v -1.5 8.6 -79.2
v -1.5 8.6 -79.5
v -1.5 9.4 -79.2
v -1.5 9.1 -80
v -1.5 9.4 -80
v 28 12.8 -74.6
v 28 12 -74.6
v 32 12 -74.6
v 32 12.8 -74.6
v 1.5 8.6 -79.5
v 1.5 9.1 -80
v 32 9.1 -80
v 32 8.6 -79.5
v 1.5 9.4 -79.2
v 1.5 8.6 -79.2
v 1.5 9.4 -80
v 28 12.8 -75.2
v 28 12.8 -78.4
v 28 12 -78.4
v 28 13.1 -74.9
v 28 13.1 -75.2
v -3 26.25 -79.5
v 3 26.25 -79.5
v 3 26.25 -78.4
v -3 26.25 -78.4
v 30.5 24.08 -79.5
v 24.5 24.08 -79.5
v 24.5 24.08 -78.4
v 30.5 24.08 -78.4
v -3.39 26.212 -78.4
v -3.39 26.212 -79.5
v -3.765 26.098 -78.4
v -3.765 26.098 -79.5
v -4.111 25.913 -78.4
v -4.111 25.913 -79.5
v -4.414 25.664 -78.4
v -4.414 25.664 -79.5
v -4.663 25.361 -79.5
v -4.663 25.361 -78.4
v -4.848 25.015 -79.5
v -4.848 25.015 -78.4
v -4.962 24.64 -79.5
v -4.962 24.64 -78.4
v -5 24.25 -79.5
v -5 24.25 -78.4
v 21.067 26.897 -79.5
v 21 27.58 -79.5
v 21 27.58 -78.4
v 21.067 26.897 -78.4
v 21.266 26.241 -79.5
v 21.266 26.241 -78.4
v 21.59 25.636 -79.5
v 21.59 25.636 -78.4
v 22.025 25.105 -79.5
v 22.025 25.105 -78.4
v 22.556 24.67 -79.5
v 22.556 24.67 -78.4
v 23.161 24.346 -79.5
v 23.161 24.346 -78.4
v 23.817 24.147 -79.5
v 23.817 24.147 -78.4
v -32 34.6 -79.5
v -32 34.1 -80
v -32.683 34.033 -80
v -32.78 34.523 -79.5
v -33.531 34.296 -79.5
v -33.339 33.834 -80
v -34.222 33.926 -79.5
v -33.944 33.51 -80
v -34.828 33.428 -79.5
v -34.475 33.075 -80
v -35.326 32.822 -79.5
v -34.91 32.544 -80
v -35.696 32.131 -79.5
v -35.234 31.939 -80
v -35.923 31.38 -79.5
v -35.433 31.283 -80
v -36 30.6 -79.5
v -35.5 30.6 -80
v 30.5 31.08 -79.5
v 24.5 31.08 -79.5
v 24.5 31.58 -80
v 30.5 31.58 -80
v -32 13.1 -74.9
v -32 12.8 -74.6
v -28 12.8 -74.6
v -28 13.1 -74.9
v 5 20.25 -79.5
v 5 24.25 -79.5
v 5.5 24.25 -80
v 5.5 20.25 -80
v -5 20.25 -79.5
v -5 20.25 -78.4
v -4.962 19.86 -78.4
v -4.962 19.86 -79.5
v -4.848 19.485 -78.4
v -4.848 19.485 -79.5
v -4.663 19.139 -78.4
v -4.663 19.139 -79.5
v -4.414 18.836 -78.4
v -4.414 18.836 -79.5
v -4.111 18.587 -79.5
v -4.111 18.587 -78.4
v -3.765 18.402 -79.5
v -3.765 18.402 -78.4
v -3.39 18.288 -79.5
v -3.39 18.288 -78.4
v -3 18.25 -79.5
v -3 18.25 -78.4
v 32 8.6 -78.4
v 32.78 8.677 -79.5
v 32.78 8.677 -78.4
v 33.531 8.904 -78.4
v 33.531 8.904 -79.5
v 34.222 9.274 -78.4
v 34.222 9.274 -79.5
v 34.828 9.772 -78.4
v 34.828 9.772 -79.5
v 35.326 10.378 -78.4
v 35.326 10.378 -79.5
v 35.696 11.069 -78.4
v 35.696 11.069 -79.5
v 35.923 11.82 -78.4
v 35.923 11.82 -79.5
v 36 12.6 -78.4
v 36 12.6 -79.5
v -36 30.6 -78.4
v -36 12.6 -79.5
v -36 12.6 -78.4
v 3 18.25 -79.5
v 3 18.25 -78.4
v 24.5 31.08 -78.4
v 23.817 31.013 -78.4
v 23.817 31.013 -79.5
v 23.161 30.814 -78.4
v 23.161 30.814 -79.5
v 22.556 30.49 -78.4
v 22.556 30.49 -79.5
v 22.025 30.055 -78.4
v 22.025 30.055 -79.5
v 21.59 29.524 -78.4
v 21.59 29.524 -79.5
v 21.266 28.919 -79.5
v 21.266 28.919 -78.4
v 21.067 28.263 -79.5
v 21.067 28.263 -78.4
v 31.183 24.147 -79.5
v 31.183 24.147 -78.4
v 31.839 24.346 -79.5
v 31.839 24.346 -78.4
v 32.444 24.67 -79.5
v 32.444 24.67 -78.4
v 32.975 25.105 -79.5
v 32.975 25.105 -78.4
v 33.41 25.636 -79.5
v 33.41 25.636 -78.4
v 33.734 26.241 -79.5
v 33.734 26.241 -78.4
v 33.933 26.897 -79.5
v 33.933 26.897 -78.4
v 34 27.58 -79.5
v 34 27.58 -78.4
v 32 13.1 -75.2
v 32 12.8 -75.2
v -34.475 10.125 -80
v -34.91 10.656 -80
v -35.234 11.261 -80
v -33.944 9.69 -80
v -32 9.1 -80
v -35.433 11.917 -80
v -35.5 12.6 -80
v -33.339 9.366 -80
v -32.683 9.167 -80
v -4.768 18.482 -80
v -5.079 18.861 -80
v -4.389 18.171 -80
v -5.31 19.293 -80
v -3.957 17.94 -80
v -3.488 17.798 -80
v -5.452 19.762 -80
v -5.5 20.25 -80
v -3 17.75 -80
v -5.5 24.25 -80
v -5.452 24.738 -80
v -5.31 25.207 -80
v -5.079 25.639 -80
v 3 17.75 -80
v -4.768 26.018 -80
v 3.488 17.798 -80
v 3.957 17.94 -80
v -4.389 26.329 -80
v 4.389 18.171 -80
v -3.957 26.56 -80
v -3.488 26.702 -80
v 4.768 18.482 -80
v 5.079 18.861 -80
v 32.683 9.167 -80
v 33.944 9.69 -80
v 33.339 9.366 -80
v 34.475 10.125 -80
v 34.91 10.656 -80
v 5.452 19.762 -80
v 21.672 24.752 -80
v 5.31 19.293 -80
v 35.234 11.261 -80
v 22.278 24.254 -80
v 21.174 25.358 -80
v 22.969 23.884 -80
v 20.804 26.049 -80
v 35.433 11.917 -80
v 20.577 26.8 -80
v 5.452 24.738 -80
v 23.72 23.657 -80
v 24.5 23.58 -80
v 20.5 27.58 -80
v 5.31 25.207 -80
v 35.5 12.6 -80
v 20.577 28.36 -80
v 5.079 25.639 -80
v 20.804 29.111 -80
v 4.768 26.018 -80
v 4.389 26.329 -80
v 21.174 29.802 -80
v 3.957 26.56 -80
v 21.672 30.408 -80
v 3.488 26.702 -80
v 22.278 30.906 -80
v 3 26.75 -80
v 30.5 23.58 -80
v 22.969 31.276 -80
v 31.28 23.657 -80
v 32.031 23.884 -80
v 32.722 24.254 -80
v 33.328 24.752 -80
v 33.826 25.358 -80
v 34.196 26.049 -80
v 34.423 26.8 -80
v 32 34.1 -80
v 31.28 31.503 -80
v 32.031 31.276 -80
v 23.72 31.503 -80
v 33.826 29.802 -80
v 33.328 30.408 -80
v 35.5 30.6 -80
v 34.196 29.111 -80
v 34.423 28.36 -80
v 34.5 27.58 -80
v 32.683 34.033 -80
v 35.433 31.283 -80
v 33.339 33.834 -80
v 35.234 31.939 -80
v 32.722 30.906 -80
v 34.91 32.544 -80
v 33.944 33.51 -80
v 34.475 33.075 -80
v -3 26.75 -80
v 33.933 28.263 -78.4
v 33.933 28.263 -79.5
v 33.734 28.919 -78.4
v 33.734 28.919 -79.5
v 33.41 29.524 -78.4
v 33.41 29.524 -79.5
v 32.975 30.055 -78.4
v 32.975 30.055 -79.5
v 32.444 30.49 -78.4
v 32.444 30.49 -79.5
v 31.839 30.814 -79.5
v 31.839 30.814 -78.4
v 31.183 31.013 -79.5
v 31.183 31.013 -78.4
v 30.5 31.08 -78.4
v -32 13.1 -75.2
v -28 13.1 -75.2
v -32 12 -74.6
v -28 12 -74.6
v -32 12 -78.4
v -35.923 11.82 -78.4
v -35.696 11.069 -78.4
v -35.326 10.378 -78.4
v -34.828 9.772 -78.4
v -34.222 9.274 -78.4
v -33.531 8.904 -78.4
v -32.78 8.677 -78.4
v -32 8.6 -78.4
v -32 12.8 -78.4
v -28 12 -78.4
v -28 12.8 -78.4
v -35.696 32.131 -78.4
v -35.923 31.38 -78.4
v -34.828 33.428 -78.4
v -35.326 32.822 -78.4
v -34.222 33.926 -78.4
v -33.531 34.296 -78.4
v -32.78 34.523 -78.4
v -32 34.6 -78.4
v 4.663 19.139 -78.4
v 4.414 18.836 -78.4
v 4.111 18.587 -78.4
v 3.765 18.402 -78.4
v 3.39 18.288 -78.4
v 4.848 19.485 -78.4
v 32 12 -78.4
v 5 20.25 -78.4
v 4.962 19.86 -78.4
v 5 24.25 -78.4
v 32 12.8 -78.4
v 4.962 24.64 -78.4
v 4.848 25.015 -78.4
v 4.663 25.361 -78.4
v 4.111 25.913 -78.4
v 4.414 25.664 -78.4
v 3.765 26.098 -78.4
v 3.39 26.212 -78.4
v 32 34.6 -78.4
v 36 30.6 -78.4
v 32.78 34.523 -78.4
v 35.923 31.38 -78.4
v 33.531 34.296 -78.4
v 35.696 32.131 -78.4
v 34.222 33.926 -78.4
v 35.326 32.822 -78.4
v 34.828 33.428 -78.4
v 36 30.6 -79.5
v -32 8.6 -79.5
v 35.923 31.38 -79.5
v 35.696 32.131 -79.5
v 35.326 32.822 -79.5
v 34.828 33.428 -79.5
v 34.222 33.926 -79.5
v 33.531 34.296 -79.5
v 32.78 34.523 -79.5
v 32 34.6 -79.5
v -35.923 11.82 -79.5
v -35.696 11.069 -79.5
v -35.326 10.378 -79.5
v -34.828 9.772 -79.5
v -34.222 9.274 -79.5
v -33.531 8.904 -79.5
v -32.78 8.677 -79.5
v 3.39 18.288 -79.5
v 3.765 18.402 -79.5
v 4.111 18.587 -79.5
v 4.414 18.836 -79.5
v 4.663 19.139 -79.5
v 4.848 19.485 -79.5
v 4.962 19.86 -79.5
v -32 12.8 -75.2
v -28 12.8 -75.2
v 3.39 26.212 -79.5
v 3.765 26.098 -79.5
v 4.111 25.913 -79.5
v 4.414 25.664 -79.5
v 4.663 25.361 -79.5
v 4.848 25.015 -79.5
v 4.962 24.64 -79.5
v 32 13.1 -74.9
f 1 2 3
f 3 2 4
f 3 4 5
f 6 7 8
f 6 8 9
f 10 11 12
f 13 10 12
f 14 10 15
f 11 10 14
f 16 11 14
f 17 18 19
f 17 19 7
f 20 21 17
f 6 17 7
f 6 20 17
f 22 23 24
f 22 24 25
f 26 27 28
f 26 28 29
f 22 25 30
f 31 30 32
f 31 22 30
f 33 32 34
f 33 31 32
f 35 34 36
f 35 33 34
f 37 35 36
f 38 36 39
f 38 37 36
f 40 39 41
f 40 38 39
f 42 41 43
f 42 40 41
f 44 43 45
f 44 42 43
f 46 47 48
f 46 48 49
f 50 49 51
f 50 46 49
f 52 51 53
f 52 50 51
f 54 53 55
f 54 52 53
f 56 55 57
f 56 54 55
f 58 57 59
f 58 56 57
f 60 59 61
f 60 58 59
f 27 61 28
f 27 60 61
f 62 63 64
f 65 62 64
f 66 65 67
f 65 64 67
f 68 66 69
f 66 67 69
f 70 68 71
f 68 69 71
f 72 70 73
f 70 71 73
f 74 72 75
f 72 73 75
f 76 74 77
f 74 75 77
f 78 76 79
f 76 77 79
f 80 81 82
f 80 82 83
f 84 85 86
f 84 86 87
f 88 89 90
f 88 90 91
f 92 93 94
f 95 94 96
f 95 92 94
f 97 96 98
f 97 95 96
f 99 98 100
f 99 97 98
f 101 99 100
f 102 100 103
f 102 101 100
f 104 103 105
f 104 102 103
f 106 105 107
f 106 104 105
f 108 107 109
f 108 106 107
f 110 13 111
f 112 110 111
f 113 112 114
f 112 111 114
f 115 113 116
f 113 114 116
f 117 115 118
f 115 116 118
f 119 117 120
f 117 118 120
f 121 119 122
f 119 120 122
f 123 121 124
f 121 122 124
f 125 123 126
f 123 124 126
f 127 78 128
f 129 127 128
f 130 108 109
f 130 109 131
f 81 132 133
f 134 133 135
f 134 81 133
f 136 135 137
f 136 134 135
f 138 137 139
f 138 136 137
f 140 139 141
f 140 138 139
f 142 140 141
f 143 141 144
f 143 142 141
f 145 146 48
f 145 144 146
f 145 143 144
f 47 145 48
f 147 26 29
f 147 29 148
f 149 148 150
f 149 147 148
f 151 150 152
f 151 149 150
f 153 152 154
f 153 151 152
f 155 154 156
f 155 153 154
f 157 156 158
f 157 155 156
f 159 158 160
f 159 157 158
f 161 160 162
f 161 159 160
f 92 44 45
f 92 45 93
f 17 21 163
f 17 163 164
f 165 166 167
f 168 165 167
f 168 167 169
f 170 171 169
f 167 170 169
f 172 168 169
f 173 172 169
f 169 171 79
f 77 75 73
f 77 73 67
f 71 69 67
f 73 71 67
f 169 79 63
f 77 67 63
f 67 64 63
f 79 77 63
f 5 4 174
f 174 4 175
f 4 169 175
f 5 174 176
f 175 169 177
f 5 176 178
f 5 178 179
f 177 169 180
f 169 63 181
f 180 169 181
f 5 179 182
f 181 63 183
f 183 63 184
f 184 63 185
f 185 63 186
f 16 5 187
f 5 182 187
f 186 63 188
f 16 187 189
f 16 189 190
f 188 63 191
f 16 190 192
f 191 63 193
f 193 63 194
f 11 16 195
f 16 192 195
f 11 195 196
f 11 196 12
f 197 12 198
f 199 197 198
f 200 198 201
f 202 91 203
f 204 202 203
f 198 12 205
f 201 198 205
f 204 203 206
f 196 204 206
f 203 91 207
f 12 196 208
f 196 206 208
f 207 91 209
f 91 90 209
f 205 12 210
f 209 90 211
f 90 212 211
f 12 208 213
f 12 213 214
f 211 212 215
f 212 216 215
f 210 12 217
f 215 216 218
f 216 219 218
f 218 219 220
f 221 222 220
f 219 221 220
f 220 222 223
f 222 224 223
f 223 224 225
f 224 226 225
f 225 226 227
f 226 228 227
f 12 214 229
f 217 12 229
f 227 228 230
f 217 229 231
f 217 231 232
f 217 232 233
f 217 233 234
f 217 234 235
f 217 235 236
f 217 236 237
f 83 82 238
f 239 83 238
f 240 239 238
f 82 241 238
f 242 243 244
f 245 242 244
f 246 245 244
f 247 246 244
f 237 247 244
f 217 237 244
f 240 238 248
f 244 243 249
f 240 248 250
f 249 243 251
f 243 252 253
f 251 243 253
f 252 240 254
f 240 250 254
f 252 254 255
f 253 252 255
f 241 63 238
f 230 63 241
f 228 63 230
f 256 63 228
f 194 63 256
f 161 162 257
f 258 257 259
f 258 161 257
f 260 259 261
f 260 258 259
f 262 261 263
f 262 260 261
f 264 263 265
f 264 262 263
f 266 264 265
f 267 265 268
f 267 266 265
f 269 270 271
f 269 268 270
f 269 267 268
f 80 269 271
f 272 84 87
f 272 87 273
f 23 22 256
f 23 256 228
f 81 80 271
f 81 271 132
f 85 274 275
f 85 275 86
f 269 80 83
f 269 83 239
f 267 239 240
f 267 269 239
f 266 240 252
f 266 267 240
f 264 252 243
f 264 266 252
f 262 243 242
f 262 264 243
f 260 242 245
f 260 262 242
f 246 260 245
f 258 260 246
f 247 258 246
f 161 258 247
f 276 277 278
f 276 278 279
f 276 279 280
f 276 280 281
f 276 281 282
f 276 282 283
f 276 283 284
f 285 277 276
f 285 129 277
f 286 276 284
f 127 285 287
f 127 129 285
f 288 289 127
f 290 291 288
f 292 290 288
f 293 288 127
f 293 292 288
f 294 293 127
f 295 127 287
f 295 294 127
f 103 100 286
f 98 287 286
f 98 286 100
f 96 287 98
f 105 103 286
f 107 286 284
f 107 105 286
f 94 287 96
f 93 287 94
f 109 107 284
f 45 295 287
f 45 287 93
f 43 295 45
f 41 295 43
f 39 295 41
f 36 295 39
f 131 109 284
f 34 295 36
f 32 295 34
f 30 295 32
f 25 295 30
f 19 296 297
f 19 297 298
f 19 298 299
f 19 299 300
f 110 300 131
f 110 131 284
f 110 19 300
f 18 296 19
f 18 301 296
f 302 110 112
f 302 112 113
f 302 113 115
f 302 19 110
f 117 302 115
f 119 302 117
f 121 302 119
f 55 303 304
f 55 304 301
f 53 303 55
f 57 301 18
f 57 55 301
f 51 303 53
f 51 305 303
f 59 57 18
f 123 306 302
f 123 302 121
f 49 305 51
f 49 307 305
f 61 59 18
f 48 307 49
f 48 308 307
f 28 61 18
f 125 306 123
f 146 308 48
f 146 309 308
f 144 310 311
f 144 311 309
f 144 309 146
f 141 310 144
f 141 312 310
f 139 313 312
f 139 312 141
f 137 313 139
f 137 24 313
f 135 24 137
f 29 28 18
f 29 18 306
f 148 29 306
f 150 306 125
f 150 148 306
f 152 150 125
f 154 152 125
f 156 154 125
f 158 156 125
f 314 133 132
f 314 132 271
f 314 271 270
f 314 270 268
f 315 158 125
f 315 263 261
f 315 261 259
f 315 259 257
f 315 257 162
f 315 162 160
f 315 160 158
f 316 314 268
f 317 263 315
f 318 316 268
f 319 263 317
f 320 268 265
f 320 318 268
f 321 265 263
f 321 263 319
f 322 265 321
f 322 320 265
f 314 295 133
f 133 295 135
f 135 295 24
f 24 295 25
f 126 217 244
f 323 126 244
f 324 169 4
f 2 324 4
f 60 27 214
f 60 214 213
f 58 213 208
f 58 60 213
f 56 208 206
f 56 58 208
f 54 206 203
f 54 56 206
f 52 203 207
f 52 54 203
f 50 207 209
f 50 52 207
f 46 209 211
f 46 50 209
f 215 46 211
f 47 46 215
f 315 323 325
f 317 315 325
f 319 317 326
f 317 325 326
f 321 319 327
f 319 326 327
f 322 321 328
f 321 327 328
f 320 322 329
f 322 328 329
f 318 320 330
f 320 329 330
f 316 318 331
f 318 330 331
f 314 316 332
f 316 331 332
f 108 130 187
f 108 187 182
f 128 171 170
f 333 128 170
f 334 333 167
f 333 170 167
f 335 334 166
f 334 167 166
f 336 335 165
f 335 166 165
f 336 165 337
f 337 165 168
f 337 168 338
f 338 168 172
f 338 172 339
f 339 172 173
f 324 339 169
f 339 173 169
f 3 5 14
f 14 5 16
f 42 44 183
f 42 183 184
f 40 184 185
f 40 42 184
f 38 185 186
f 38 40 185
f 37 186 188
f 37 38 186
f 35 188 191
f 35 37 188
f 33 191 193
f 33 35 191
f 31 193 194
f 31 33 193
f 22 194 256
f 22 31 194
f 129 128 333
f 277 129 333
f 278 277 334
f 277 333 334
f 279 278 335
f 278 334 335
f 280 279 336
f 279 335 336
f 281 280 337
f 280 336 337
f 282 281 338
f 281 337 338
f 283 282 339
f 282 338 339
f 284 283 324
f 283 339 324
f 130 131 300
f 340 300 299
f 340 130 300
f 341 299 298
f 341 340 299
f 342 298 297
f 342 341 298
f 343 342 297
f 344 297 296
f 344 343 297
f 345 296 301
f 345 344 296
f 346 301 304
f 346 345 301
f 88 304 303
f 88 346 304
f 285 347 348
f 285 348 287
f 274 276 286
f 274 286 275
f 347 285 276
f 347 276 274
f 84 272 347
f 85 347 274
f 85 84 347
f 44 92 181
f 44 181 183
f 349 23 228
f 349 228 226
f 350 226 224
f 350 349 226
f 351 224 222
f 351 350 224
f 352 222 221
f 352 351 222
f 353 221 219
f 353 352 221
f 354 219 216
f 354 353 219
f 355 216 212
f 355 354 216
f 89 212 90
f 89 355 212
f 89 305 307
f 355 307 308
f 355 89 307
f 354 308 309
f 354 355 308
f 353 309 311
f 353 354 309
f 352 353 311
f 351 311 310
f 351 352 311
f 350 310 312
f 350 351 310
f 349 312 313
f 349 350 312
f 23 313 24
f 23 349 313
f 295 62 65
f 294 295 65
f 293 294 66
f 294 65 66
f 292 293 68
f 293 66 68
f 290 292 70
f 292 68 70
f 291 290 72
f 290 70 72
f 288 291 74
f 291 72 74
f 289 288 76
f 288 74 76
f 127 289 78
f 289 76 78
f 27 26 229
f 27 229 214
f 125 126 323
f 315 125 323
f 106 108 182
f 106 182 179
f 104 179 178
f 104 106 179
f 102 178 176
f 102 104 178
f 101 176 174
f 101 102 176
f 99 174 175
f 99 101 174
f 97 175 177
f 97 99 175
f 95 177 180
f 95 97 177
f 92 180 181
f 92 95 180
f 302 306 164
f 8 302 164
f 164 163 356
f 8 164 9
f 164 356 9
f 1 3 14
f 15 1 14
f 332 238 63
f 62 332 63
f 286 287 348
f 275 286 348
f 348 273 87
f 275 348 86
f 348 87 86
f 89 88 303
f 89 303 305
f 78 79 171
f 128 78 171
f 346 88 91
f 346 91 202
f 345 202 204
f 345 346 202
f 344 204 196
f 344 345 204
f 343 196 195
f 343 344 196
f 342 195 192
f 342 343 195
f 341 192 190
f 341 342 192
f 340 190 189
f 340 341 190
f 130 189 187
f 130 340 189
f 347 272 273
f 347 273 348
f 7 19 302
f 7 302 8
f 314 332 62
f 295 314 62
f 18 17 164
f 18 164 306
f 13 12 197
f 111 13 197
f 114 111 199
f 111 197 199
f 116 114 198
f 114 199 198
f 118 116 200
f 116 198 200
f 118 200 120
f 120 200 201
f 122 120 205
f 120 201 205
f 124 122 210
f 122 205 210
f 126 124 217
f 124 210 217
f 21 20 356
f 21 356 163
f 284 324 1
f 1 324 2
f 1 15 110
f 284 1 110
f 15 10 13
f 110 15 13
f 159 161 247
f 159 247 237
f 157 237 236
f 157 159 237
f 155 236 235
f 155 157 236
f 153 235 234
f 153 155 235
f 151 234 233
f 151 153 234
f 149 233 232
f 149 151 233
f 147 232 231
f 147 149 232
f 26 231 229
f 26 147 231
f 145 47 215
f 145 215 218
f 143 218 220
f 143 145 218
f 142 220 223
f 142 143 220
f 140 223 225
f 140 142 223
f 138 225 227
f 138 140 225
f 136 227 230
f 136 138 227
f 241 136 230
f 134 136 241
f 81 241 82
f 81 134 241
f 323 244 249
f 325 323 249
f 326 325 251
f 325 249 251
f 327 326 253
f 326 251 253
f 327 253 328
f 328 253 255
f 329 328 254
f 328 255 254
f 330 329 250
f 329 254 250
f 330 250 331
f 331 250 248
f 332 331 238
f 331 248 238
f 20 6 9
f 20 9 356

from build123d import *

# Parameters (mm, degrees)
BOSS_EXTRUDE1_START = -80
BOSS_EXTRUDE1_DEPTH = 1.6
CHAMFER1_SIZE       = 0.5
BOSS_EXTRUDE2_START = -81
BOSS_EXTRUDE2_DEPTH = 3
CHAMFER2_SIZE       = 0.5
BOSS_EXTRUDE3_START = -81
BOSS_EXTRUDE3_DEPTH = 3
CHAMFER3_SIZE       = 0.5
BOSS_EXTRUDE4_START = -80.1
SKETCH4_W           = 3
SKETCH4_H           = 0.9
BOSS_EXTRUDE4_DEPTH = 0.9
BOSS_EXTRUDE5_START = -32
BOSS_EXTRUDE5_DEPTH = 4
BOSS_EXTRUDE6_START = 28
BOSS_EXTRUDE6_DEPTH = 4


with BuildPart() as part:
    # Sketch1 → Boss-Extrude1 (new body)
    with BuildSketch(Plane.XY.offset(BOSS_EXTRUDE1_START)):
        with BuildLine():
            Line((-32, 8.6), (32, 8.6))
            ThreePointArc((32, 8.6), (34.828427125, 9.771572875), (36, 12.6))
            Line((36, 12.6), (36, 30.6))
            ThreePointArc((36, 30.6), (34.828427125, 33.428427125), (32, 34.6))
            Line((32, 34.6), (-32, 34.6))
            ThreePointArc((-32, 34.6), (-34.828427125, 33.428427125), (-36, 30.6))
            Line((-36, 30.6), (-36, 12.6))
            ThreePointArc((-36, 12.6), (-34.828427125, 9.771572875), (-32, 8.6))
        make_face()
    extrude(amount=BOSS_EXTRUDE1_DEPTH)

    # Chamfer1
    chamfer1_edges = [part.edges().sort_by_distance(p)[0] for p in [
        (36, 21.6, -80),
        (34.828427125, 9.771572875, -80),
        (0, 8.6, -80),
        (-34.828427125, 9.771572875, -80),
        (-36, 21.6, -80),
        (-34.828427125, 33.428427125, -80),
        (0, 34.6, -80),
        (34.828427125, 33.428427125, -80),
    ]]
    chamfer(chamfer1_edges, length=CHAMFER1_SIZE)


with BuildPart() as body_2:
    # Sketch2 → Boss-Extrude2 (new body)
    with BuildSketch(Plane.XY.offset(BOSS_EXTRUDE2_START)):
        with BuildLine():
            Line((-3, 18.25), (3, 18.25))
            ThreePointArc((3, 18.25), (4.414213562, 18.835786438), (5, 20.25))
            Line((5, 20.25), (5, 24.25))
            ThreePointArc((5, 24.25), (4.414213562, 25.664213562), (3, 26.25))
            Line((3, 26.25), (-3, 26.25))
            ThreePointArc((-3, 26.25), (-4.414213562, 25.664213562), (-5, 24.25))
            Line((-5, 24.25), (-5, 20.25))
            ThreePointArc((-5, 20.25), (-4.414213562, 18.835786438), (-3, 18.25))
        make_face()
    extrude(amount=BOSS_EXTRUDE2_DEPTH)


with BuildPart() as part_1:
    add(part.part)

    # Combine1: cut body 2
    add(body_2.part, mode=Mode.SUBTRACT)

    # Chamfer2
    chamfer2_edges = [part_1.edges().sort_by_distance(p)[0] for p in [
        (-5, 22.25, -80),
        (-4.414213562, 25.664213562, -80),
        (0, 26.25, -80),
        (4.414213562, 25.664213562, -80),
        (5, 22.25, -80),
        (4.414213562, 18.835786438, -80),
        (0, 18.25, -80),
        (-4.414213562, 18.835786438, -80),
    ]]
    chamfer(chamfer2_edges, length=CHAMFER2_SIZE)


with BuildPart() as body_2_2:
    # Sketch3 → Boss-Extrude3 (new body)
    with BuildSketch(Plane.XY.offset(BOSS_EXTRUDE3_START)):
        with BuildLine():
            Line((24.5, 24.08), (30.5, 24.08))
            ThreePointArc((30.5, 24.08), (32.974873734, 25.105126266), (34, 27.58))
            ThreePointArc((34, 27.58), (32.974873734, 30.054873734), (30.5, 31.08))
            Line((30.5, 31.08), (24.5, 31.08))
            ThreePointArc((24.5, 31.08), (22.025126266, 30.054873734), (21, 27.58))
            ThreePointArc((21, 27.58), (22.025126266, 25.105126266), (24.5, 24.08))
        make_face()
    extrude(amount=BOSS_EXTRUDE3_DEPTH)


with BuildPart() as part_2:
    add(part_1.part)

    # Combine2: cut body 2 2
    add(body_2_2.part, mode=Mode.SUBTRACT)

    # Chamfer3
    chamfer3_edges = [part_2.edges().sort_by_distance(p)[0] for p in [
        (27.5, 31.08, -80),
        (34, 27.58, -80),
        (27.5, 24.08, -80),
        (21, 27.58, -80),
    ]]
    chamfer(chamfer3_edges, length=CHAMFER3_SIZE)


with BuildPart() as body_2_3:
    # Sketch4 → Boss-Extrude4 (new body)
    with BuildSketch(Plane.XY.offset(BOSS_EXTRUDE4_START)):
        with Locations((0, 8.95)):
            Rectangle(SKETCH4_W, SKETCH4_H)
    extrude(amount=BOSS_EXTRUDE4_DEPTH)


with BuildPart() as part_3:
    add(part_2.part)

    # Combine3: cut body 2 3
    add(body_2_3.part, mode=Mode.SUBTRACT)

    # Sketch5 → Boss-Extrude5 (add)
    with BuildSketch(Plane(origin=(0, 0, 0), x_dir=(0, 0, -1), z_dir=(1, 0, 0)).offset(BOSS_EXTRUDE5_START)):
        Polygon((78.41, 12), (74.6, 12), (74.6, 12.8), (74.9, 13.1), (75.2, 13.1), (75.2, 12.8), (78.41, 12.8), align=None)
    extrude(amount=BOSS_EXTRUDE5_DEPTH)

    # Sketch6 → Boss-Extrude6 (add)
    with BuildSketch(Plane(origin=(0, 0, 0), x_dir=(0, 0, -1), z_dir=(1, 0, 0)).offset(BOSS_EXTRUDE6_START)):
        Polygon((78.41, 12), (74.6, 12), (74.6, 12.8), (74.9, 13.1), (75.2, 13.1), (75.2, 12.8), (78.41, 12.8), align=None)
    extrude(amount=BOSS_EXTRUDE6_DEPTH)


solid = part_3.part
